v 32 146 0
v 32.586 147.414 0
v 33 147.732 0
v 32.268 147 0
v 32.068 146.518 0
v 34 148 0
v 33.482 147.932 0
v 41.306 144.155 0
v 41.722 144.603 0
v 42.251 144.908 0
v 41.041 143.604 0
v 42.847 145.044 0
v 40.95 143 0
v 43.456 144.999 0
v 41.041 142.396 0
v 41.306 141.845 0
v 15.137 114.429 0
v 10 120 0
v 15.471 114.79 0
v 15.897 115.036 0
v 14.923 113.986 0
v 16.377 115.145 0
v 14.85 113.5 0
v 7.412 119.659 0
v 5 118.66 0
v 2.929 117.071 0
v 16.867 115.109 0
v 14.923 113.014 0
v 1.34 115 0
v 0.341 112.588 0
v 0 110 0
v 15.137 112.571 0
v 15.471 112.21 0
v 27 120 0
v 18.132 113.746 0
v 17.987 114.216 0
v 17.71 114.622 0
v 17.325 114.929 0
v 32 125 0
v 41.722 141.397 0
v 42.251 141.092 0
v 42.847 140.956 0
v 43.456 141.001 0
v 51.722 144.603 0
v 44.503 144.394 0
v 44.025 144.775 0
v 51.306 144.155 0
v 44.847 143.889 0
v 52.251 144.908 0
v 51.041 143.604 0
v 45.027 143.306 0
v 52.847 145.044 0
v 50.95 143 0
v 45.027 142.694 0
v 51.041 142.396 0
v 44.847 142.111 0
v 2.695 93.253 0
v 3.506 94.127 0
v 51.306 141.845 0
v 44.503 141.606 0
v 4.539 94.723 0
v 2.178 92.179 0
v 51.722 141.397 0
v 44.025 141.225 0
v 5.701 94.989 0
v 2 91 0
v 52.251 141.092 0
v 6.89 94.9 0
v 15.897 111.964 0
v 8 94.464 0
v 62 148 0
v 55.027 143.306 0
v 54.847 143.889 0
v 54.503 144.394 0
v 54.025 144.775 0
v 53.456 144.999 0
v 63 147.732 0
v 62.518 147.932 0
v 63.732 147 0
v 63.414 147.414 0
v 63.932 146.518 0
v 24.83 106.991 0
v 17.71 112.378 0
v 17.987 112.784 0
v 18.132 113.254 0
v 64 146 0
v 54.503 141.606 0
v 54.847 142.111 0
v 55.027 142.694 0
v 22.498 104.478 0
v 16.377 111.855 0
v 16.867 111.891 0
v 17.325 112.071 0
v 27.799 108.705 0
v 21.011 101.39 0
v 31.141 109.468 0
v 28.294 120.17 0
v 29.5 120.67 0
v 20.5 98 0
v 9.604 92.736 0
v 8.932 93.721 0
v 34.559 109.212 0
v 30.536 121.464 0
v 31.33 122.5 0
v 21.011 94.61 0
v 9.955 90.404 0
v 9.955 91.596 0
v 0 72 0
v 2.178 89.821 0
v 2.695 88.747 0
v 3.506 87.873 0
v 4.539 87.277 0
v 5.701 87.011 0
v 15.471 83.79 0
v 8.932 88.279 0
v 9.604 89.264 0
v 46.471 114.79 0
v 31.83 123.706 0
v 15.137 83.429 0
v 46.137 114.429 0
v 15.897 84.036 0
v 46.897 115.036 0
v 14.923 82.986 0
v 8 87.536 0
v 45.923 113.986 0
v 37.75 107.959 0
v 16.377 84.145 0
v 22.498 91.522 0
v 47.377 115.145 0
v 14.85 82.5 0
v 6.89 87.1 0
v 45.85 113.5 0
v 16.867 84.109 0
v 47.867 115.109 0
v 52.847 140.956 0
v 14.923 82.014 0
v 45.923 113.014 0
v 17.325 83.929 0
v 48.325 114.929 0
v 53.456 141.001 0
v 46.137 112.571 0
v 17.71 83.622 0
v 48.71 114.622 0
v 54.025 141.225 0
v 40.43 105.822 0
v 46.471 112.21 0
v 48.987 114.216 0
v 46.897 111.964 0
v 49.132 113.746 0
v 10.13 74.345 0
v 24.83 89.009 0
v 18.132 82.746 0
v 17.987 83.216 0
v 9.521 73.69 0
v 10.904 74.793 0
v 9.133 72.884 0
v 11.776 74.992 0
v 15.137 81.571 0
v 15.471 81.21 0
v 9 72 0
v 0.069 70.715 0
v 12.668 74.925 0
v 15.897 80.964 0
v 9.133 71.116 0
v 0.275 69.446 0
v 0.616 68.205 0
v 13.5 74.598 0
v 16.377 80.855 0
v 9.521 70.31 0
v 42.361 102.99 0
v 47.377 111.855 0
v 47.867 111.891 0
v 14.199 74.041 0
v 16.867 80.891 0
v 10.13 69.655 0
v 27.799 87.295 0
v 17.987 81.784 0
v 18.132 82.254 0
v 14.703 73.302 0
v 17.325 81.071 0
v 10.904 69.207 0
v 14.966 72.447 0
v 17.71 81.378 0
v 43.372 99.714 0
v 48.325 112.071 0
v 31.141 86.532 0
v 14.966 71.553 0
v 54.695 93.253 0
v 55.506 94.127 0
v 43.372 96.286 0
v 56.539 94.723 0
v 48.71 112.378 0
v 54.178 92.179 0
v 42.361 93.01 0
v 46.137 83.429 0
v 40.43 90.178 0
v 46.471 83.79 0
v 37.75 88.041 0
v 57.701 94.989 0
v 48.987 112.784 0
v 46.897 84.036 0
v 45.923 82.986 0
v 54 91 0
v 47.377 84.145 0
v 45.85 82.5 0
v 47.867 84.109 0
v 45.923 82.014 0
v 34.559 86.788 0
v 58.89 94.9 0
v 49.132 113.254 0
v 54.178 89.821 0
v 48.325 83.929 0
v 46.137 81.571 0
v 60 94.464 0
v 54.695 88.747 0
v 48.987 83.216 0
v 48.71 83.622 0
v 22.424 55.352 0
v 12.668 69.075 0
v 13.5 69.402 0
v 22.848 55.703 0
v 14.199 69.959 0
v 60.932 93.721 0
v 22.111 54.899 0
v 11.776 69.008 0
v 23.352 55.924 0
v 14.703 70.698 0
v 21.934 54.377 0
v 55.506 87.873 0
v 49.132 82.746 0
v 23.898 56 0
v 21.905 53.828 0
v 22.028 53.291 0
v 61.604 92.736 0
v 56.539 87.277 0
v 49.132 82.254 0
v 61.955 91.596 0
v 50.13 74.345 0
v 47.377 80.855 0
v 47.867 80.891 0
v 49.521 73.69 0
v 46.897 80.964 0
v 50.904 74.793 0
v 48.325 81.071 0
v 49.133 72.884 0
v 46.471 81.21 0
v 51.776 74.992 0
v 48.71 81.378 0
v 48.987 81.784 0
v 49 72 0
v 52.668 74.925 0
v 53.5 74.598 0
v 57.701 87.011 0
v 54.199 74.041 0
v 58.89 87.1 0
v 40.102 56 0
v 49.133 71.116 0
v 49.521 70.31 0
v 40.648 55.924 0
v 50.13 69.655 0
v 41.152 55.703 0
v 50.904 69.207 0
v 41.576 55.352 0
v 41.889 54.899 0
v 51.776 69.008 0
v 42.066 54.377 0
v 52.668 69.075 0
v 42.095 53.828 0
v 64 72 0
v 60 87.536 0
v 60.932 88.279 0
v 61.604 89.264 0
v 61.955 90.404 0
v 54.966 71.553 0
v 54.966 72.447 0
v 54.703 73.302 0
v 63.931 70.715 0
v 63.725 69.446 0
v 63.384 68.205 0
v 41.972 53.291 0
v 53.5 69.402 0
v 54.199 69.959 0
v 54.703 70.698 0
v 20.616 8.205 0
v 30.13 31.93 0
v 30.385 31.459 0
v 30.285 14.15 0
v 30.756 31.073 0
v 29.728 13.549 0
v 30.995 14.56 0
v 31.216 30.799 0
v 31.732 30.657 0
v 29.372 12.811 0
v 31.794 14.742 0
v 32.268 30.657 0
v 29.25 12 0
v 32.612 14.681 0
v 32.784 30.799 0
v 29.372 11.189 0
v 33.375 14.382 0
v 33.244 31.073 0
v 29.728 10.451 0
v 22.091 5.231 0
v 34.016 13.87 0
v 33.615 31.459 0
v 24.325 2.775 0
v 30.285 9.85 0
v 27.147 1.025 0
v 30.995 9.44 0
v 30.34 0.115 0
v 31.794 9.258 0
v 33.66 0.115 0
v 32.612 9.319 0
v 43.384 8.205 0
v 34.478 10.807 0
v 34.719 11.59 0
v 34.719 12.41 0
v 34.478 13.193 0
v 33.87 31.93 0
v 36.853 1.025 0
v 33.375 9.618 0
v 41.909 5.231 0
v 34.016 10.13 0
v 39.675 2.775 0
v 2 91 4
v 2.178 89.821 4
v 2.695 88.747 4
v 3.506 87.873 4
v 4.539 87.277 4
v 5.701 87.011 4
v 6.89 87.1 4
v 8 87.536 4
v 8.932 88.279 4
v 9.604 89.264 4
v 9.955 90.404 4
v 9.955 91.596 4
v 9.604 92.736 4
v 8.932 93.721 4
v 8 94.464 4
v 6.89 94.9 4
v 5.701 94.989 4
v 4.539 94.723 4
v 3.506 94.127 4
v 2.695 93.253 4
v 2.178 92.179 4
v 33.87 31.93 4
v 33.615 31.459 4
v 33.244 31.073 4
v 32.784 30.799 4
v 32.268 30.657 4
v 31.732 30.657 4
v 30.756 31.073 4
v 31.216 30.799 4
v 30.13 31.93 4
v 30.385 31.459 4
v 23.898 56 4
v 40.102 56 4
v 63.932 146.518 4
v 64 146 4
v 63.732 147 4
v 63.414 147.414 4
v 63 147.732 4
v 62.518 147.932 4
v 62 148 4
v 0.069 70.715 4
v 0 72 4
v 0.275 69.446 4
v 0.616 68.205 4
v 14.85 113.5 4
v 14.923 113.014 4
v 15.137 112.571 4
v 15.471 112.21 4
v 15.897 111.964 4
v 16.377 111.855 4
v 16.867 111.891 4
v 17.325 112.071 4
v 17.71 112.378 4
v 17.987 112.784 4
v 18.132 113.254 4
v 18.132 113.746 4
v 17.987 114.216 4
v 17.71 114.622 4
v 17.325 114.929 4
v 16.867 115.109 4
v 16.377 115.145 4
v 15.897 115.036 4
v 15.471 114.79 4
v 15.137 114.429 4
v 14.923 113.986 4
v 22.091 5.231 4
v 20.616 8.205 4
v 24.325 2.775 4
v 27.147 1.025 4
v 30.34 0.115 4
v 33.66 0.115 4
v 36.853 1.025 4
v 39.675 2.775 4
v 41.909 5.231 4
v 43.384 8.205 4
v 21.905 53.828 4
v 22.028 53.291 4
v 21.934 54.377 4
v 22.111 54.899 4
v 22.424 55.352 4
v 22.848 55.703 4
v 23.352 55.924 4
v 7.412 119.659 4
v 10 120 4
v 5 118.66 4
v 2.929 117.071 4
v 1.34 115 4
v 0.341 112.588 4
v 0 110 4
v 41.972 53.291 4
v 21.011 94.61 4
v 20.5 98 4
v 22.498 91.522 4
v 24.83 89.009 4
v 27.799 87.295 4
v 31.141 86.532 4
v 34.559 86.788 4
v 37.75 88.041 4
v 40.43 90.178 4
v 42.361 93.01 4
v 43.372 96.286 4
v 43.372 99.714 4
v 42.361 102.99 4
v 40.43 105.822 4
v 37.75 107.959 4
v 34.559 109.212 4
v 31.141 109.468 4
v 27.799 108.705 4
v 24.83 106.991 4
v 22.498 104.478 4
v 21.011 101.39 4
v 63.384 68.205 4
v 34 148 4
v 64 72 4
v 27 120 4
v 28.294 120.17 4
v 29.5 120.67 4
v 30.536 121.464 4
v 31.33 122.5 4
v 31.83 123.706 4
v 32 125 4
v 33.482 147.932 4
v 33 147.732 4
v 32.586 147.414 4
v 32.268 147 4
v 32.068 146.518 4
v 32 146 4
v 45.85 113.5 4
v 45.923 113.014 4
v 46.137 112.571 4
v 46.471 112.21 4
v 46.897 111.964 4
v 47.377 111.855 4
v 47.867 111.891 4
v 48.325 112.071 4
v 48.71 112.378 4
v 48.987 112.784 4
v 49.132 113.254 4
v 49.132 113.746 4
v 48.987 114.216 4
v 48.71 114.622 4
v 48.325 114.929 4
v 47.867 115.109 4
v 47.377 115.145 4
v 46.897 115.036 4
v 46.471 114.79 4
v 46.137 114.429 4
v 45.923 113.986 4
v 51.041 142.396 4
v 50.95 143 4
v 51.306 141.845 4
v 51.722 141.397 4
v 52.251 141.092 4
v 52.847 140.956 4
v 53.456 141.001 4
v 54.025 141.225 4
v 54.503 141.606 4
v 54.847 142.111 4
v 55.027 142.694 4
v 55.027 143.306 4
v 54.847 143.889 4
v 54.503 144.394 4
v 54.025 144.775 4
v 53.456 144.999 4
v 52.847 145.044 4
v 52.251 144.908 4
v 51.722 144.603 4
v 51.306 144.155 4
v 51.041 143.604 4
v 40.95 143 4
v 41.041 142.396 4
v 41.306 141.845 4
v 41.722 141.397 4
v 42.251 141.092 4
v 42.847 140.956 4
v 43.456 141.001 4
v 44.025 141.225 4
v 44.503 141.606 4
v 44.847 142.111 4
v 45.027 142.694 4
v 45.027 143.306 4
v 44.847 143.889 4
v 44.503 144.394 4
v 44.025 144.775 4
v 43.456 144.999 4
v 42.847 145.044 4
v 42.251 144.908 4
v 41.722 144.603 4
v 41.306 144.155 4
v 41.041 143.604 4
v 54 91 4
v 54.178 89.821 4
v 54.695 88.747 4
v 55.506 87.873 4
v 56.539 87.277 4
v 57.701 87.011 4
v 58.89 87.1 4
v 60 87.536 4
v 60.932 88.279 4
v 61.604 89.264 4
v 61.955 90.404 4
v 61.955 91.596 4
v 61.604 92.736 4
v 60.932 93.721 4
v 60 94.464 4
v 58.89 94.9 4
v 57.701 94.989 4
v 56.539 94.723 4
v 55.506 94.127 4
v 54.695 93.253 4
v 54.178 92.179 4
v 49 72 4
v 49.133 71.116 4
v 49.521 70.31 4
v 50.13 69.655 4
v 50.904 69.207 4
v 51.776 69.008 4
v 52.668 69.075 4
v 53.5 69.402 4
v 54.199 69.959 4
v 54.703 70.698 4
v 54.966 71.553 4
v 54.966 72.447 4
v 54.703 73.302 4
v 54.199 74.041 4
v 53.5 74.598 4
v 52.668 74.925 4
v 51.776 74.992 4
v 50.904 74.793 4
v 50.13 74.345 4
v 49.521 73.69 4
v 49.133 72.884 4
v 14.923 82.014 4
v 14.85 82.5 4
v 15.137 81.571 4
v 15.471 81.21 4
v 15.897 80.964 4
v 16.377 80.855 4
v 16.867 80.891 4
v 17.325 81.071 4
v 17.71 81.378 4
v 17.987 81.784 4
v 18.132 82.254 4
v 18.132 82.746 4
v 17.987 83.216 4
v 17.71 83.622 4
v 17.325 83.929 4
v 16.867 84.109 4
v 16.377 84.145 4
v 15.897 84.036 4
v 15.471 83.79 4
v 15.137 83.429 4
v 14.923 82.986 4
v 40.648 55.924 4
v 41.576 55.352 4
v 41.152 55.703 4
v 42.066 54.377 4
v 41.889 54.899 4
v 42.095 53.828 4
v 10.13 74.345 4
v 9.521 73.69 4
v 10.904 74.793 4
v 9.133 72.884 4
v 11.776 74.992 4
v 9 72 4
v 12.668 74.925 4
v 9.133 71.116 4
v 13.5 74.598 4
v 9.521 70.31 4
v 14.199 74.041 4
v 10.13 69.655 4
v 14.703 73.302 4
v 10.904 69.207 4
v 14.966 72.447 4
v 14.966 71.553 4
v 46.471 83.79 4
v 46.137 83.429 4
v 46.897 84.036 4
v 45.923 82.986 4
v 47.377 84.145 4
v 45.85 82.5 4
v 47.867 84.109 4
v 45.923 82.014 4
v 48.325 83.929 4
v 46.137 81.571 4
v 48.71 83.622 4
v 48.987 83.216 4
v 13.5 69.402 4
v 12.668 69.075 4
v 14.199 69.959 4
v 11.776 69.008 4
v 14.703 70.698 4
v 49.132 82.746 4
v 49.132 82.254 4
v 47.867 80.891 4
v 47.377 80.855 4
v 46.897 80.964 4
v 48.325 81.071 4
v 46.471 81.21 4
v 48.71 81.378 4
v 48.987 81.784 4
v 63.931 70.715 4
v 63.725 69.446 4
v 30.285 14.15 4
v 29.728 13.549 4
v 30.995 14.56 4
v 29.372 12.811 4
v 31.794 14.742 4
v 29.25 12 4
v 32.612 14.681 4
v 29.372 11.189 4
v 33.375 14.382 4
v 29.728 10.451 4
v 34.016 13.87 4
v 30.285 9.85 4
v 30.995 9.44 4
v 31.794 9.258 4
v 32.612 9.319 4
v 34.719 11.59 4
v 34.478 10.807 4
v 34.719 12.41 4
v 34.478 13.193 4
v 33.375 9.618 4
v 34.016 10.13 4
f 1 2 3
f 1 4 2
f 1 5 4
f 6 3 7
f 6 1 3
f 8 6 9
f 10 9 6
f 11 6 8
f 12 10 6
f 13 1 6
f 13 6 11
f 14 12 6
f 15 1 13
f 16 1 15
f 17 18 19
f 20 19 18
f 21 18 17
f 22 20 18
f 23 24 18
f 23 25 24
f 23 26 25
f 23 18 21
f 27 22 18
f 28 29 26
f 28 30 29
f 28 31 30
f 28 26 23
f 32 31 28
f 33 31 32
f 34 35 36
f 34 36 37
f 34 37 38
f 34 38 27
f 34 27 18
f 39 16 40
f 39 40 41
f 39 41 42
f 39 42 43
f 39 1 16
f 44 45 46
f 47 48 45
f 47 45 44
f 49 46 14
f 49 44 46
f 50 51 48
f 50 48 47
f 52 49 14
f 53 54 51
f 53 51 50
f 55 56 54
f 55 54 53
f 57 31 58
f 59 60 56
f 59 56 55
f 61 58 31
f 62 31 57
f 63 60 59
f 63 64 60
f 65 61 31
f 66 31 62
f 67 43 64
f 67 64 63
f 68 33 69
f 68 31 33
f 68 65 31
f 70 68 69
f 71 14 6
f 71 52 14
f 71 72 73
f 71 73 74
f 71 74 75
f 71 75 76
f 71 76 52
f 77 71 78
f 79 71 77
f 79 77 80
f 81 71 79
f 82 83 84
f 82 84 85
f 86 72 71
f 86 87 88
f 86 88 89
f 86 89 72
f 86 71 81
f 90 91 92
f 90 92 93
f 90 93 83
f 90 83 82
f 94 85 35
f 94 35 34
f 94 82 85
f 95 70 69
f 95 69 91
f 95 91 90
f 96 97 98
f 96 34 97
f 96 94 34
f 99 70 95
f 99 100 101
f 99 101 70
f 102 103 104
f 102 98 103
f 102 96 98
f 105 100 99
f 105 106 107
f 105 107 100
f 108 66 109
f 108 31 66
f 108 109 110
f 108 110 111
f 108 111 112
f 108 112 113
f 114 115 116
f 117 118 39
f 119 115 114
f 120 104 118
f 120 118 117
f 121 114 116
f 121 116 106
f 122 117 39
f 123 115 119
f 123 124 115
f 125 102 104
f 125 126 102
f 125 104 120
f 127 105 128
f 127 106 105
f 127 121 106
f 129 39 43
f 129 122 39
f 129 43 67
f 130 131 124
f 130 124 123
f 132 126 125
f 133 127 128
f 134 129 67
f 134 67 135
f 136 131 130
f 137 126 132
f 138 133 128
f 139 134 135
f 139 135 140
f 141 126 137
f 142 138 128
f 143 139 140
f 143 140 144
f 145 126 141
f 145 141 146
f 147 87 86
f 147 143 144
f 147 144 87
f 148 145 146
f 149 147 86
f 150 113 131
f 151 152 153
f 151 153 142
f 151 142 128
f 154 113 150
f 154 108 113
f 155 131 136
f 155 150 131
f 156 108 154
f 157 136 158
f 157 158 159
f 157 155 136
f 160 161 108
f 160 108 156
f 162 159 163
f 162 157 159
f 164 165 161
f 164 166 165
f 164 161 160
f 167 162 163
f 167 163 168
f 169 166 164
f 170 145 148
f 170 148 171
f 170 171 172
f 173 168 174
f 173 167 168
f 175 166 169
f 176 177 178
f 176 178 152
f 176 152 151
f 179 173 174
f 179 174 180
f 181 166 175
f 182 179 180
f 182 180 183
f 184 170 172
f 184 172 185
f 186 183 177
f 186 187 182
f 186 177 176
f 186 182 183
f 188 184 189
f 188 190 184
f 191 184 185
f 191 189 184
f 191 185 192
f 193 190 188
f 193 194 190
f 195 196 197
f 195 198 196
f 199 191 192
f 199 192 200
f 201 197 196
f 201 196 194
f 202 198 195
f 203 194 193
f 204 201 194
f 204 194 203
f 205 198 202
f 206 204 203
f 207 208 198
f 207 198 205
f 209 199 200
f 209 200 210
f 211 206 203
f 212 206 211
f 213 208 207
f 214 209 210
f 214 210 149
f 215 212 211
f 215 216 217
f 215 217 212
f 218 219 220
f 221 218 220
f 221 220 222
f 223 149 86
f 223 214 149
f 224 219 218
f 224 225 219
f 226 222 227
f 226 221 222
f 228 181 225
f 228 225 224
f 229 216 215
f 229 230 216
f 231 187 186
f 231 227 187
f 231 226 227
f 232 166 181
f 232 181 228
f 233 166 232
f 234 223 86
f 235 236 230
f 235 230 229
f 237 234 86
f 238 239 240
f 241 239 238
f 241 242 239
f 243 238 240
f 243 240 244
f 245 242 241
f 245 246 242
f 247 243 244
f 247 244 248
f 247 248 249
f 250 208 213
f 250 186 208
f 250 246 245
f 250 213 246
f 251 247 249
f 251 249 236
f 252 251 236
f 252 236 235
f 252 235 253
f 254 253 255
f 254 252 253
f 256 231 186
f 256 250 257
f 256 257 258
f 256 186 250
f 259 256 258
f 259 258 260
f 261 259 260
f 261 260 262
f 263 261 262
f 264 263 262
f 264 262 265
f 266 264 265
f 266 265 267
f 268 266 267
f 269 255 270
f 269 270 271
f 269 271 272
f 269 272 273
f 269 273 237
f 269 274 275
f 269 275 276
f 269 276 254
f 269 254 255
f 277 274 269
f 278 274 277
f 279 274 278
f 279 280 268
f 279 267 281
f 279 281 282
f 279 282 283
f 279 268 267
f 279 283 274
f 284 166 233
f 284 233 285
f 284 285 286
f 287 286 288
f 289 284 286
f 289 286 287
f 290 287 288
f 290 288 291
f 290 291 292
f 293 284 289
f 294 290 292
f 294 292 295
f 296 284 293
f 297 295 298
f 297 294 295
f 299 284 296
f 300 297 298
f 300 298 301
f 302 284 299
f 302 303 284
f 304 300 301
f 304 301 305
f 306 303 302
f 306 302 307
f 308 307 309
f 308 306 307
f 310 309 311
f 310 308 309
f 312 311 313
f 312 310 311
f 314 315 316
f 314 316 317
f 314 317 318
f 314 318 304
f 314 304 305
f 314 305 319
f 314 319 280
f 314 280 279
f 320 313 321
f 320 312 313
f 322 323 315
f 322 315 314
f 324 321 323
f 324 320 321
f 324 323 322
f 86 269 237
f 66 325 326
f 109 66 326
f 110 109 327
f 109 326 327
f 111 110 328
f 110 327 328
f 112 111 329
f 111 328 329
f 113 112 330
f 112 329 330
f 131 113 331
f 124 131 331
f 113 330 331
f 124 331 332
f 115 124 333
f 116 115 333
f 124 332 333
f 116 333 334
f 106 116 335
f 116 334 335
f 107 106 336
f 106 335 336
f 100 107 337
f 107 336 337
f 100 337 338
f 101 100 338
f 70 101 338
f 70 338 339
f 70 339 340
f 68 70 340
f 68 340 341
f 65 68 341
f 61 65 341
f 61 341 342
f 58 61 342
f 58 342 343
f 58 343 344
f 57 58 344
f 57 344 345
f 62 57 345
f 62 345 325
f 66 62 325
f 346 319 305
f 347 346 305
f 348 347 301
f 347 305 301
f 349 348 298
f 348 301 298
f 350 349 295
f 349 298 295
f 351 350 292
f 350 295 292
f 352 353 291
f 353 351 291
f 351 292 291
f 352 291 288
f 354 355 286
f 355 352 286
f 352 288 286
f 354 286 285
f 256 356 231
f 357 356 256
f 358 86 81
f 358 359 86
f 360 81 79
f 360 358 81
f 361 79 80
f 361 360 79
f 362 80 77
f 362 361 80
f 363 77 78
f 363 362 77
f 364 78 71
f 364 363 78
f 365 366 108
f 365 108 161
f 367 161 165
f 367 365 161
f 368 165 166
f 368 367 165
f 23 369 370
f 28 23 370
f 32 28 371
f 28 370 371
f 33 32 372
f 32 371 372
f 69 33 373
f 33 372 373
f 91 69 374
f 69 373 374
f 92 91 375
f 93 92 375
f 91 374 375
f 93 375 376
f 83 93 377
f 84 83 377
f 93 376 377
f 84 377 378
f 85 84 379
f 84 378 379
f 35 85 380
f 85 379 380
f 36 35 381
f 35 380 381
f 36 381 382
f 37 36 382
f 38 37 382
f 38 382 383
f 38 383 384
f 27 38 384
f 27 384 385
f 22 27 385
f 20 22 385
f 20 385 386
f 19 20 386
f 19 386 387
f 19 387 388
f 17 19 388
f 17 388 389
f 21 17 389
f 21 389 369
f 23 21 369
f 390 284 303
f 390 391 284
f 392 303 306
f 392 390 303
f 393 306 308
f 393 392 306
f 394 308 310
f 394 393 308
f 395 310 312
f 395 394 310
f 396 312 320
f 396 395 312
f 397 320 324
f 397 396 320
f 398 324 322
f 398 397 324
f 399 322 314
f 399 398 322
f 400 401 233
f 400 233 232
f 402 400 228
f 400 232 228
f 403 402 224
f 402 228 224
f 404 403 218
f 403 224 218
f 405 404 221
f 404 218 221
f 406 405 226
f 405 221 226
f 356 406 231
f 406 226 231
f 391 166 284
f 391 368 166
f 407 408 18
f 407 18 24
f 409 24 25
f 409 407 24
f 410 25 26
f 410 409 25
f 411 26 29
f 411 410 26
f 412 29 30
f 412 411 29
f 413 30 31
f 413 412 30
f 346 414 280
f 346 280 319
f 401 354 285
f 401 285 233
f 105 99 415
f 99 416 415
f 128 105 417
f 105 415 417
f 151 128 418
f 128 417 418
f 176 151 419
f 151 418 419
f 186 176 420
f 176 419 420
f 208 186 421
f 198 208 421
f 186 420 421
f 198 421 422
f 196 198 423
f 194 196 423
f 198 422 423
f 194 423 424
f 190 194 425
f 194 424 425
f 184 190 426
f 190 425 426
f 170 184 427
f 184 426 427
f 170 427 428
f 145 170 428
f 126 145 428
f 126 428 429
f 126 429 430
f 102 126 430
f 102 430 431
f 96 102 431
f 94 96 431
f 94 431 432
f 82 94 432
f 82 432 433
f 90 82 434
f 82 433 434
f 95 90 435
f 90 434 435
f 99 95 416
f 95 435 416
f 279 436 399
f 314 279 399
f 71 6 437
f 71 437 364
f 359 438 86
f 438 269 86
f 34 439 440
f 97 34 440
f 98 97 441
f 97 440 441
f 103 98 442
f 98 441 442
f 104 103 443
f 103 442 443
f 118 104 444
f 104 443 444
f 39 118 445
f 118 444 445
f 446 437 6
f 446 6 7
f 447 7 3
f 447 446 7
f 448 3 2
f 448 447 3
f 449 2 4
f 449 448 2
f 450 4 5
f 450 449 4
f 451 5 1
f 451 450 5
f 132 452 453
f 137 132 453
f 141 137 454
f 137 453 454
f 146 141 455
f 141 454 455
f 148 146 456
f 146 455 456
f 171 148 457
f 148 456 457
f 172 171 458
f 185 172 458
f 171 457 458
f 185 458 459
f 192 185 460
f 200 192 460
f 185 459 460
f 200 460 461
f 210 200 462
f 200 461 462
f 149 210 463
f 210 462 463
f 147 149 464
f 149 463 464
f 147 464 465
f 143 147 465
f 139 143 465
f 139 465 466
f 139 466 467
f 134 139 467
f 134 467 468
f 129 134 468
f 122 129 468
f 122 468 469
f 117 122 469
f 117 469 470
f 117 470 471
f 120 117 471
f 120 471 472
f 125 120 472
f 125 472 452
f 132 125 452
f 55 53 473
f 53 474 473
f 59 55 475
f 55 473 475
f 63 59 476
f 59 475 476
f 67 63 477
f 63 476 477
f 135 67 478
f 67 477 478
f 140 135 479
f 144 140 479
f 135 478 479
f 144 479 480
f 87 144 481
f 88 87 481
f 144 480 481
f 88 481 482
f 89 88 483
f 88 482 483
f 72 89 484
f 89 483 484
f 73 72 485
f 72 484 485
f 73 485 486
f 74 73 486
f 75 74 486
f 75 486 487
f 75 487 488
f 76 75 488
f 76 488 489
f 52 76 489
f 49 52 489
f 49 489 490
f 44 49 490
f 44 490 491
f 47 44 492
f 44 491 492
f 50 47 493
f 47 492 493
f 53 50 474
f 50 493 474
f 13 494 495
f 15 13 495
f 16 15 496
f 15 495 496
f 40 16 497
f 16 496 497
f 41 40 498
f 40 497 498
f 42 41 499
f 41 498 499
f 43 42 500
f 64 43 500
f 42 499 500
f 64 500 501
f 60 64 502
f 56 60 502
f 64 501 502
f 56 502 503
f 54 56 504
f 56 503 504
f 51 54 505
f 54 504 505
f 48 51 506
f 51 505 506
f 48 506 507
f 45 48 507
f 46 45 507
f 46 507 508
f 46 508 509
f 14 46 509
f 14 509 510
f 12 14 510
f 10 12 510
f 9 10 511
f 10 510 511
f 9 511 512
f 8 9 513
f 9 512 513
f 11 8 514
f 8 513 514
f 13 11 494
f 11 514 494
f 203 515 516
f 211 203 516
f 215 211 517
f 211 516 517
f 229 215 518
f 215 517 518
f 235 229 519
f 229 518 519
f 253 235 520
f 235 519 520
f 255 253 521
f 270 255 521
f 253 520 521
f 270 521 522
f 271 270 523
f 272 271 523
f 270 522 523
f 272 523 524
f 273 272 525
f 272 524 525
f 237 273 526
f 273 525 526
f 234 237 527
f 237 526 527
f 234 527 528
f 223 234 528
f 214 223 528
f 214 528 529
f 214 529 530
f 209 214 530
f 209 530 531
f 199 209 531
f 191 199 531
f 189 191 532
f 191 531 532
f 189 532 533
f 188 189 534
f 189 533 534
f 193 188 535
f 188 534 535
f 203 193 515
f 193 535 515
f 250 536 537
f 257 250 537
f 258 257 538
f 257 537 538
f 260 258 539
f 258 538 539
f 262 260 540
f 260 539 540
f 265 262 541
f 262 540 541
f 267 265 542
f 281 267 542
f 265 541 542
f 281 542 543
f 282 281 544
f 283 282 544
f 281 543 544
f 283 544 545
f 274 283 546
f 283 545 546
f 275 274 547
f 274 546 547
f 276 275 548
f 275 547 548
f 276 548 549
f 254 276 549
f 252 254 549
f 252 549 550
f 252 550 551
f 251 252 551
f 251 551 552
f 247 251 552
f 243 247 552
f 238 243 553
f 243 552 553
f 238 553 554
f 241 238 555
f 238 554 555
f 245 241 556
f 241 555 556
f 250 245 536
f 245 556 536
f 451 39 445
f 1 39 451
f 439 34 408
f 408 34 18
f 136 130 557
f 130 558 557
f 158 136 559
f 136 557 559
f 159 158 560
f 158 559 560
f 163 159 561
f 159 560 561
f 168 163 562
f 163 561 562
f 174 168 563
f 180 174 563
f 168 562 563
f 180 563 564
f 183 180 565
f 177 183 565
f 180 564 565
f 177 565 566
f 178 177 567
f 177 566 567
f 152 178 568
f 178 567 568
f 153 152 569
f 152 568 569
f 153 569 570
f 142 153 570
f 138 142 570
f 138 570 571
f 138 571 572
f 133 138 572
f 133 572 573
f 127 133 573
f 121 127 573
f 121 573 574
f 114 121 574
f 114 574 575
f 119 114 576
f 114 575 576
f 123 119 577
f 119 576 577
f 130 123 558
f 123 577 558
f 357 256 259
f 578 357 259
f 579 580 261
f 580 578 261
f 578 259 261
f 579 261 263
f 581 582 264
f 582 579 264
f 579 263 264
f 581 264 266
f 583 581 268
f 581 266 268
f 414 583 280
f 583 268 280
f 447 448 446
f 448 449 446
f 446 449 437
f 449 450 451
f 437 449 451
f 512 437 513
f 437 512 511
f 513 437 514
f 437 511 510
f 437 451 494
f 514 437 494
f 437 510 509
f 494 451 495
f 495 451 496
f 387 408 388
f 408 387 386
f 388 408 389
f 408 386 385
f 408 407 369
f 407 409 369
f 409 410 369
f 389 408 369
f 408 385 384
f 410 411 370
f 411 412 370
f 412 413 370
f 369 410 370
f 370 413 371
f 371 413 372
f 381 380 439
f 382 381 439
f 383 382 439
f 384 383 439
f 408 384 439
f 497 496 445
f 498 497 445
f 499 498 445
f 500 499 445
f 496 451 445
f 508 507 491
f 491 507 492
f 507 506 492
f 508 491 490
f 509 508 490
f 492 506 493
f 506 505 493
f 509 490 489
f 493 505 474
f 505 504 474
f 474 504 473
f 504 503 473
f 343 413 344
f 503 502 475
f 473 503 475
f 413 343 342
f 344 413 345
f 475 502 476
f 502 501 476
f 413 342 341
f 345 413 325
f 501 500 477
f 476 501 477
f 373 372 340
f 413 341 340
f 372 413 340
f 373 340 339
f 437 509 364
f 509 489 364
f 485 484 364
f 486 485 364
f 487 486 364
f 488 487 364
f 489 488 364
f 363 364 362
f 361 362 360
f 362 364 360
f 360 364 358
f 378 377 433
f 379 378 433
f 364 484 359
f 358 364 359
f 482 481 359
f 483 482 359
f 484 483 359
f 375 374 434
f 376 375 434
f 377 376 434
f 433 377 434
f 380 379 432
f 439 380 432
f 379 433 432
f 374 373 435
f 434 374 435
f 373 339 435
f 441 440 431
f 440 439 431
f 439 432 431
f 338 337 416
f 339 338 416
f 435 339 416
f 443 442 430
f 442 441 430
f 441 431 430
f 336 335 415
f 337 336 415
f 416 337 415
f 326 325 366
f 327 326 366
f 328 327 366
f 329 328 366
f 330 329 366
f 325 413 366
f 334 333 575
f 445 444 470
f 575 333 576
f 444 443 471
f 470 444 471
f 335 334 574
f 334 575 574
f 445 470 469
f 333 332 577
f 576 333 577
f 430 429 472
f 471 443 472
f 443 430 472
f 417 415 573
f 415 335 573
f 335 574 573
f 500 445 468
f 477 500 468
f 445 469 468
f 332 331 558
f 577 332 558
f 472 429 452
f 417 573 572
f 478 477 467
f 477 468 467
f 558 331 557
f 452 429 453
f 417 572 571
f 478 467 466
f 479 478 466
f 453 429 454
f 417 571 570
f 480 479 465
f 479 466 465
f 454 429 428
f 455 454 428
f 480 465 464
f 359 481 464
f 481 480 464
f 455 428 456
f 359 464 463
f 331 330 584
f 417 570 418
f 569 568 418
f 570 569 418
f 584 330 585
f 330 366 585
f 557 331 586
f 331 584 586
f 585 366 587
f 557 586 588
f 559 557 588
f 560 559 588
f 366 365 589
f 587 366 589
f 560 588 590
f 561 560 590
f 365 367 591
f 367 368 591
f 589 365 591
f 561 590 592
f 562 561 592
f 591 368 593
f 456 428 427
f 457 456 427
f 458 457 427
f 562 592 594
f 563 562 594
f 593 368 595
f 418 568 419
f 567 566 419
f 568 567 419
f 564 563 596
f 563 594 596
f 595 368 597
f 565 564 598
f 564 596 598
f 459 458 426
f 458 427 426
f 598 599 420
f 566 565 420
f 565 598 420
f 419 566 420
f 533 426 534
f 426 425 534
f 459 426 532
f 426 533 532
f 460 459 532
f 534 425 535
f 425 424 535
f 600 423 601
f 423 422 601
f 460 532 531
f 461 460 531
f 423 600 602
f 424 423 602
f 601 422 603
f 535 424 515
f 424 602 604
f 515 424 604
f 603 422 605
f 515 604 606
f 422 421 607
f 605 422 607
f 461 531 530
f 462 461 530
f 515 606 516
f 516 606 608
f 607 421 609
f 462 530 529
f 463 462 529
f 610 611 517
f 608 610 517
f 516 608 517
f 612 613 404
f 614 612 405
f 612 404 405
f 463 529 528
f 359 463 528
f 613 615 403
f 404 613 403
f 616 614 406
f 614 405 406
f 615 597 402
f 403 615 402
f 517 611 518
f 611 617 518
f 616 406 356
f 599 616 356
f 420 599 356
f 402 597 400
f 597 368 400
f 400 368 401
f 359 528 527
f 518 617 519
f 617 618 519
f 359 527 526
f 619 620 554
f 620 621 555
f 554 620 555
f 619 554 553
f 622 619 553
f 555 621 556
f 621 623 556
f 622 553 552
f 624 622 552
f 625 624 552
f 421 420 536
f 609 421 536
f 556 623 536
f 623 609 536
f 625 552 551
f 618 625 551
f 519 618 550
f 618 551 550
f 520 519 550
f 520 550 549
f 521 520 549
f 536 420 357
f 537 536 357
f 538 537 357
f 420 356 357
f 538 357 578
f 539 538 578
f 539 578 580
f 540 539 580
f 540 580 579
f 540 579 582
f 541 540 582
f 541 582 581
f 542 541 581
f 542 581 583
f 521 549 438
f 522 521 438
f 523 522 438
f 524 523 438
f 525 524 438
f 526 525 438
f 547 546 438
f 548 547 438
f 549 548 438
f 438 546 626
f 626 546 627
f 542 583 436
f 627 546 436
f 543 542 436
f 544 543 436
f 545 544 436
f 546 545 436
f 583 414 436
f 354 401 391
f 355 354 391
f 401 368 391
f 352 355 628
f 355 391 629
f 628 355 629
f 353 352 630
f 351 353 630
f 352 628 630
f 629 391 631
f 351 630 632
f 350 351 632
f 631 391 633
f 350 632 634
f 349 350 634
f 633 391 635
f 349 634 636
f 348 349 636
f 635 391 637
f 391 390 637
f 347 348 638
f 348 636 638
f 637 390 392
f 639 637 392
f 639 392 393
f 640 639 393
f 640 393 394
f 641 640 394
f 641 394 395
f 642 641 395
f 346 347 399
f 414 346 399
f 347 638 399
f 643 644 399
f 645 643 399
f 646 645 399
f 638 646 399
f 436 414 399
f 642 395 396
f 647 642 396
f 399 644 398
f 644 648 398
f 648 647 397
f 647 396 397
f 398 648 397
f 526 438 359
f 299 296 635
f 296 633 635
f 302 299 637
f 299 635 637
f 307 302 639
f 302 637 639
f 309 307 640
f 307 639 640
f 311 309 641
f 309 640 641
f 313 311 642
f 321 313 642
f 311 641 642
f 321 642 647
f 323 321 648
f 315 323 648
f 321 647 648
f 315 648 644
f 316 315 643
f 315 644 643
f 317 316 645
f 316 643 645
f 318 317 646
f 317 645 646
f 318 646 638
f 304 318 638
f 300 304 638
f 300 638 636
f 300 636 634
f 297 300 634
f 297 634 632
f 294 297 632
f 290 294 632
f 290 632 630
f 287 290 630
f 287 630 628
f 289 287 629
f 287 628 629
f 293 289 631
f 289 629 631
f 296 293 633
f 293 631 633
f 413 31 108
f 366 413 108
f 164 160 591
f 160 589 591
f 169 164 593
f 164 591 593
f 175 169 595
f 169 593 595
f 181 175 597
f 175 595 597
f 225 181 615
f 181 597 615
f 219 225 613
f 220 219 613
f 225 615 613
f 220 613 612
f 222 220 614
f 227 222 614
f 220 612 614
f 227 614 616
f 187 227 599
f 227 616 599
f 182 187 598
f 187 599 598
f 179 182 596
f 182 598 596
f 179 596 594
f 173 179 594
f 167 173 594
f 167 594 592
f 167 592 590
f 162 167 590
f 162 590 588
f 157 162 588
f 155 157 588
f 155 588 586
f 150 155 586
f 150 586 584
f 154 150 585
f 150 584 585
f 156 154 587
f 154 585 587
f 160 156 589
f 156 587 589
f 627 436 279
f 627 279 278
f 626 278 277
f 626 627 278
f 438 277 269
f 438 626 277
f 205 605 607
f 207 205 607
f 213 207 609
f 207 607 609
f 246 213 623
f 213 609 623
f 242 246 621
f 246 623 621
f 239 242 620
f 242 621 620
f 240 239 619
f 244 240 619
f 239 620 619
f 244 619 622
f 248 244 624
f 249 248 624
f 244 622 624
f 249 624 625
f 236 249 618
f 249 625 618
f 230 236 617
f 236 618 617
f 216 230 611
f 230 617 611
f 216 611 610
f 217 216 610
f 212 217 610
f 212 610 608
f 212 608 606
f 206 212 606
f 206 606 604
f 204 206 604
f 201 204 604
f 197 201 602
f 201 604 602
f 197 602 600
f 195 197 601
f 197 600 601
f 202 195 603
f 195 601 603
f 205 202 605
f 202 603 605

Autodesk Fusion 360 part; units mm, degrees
sketch "Sketch1" plane through (0, 0, 0) normal (0, 0, 1) x (1, 0, 0) in component "Laser Carriage - Motor Side V2"
  line L0 (0, 0) -> (64, 0)
  line L1 (64, 0) -> (64, 120)
  line L2 (64, 120) -> (0, 120)
  line L3 (0, 120) -> (0, 0)
  dimension "d1" = 64
  dimension "d2" = 120
extrude "Extrude1" add sketch "Sketch1" along normal blind 4 in component "Laser Carriage - Motor Side V2"
sketch "Sketch2" plane through (0, 0, 4) normal (0, 0, 1) x (-1, 0, 0) in component "Laser Carriage - Motor Side V2"
  line L0 (0, -120) -> (0, 0)
  line L1 (0, 0) -> (-64, 0)
  line L2 (-64, 0) -> (-64, -120)
  line L3 (-64, -120) -> (0, -120)
  line L4 (-12, -120) -> (-12, 0) construction
  line L5 (-52, -120) -> (-52, 0) construction
  line L6 (0, -12) -> (-64, -12) construction
  line L7 (0, -72) -> (-64, -72) construction
  circle A0 centre (-12, -72) radius 12 construction
  circle A1 centre (-52, -72) radius 12 construction
  circle A2 centre (-12, -72) radius 3
  circle A3 centre (-52, -72) radius 3
  circle A4 centre (-32, -12) radius 12 construction
  circle A5 centre (-32, -12) radius 2.75
  line L8 (0, -85) -> (-64, -85) construction
  line L9 (-32, -85) -> (-32, 0) construction
  line L10 (0, -42) -> (-64, -42) construction
  line L11 (0, -27) -> (-64, -27) construction
  line L12 (0, -56) -> (-64, -56) construction
  line L13 (-21, -56) -> (-21, -27) construction
  line L14 (-43, -56) -> (-43, -27) construction
  line L15 (-21, -56) -> (-43, -56)
  line L16 (-43, -56) -> (-32, -27)
  line L17 (-32, -27) -> (-21, -56)
  point P0 (-32, -42)
  dimension "d8" = 12
  dimension "d13" = 24
  dimension "d14" = 24
  dimension "d16" = 6
  dimension "d17" = 6
  dimension "d40" = 60
  dimension "d53" = 24
  dimension "d55" = 5.5
  dimension "d234" = 13
  dimension "d238" = 20
  dimension "d324" = 30
  dimension "d327" = 20
  dimension "d333" = 15
  dimension "d334" = 56
  dimension "d335" = 11
  dimension "d336" = 11
extrude "Extrude2" cut sketch "Sketch2" against normal up to surface (4 mm away) contours A2 | A3 | A5 | L15 L16 L17 in component "Laser Carriage - Motor Side V2"
sketch "Sketch16" plane through (0, 0, 4) normal (0, 0, 1) x (-1, 0, 0) in component "Laser Carriage - Motor Side V2"
  circle A0 centre (-52, -72) radius 3
  circle A1 centre (-12, -72) radius 3
  line L0 (-64, -120) -> (0, -120)
  line L1 (0, -120) -> (0, 0)
  line L2 (0, 0) -> (-64, 0)
  line L3 (-64, 0) -> (-64, -120)
  circle A2 centre (-32, -12) radius 2.75
  line L4 (0, -91) -> (-64, -91) construction
  line L5 (-64, -120) -> (0, -120) construction
  line L6 (-6, 0) -> (-6, -120) construction
  line L7 (0, -120) -> (0, 0) construction
  line L8 (-58, 0) -> (-58, -120) construction
  circle A3 centre (-6, -91) radius 4
  circle A4 centre (-58, -91) radius 4
  line L9 (0, 0) -> (-64, 0)
  line L10 (-43, -56) -> (-32, -27)
  line L11 (-32, -27) -> (-21, -56)
  line L12 (-21, -56) -> (-43, -56)
  dimension "d268" = 6
  dimension "d269" = 6
  dimension "d270" = 8
  dimension "d271" = 8
  dimension "d273" = 91
extrude "Extrude17" cut sketch "Sketch16" against normal up to surface (4 mm away) contours A3 | A4 in component "Laser Carriage - Motor Side V2"
sketch "Sketch18" plane through (0, 0, 4) normal (0, 0, 1) x (-1, 0, 0) in component "Laser Carriage - Motor Side V2"
  line L0 (-64, -120) -> (0, -120)
  line L1 (-32, -120) -> (-32, 0) construction
  line L2 (0, 0) -> (-64, 0) construction
  line L3 (-47.5, -120) -> (-47.5, 0) construction
  line L4 (-16.5, 0) -> (-16.5, -120) construction
  line L5 (-2, -113.5) -> (-62, -113.5) construction
  line L6 (-2, -82.5) -> (-62, -82.5) construction
  line L7 (-2, -98) -> (-62, -98) construction
  circle A0 centre (-32, -98) radius 11.5
  circle A1 centre (-16.5, -113.5) radius 1.65
  circle A2 centre (-47.5, -113.5) radius 1.65
  circle A3 centre (-16.5, -82.5) radius 1.65
  circle A4 centre (-47.5, -82.5) radius 1.65
  line L8 (-2, -120) -> (-62, -120) construction
  line L9 (-54, -120) -> (-10, -120) construction
  line L10 (-10, -120) -> (-10, -76) construction
  line L11 (-10, -76) -> (-54, -76) construction
  line L12 (-54, -76) -> (-54, -120) construction
  line L13 (-54, -120) -> (-10, -76) construction
  line L14 (-10, -120) -> (-54, -76) construction
  point P0 (-32, -98)
  dimension "d275" = 15.5
  dimension "d276" = 15.5
  dimension "d279" = 98
  dimension "d280" = 15.5
  dimension "d281" = 15.5
  dimension "d283" = 23
  dimension "d284" = 3.3
  dimension "d285" = 3.3
  dimension "d286" = 3.3
  dimension "d287" = 3.3
  dimension "d288" = 6.5
  dimension "d289" = 44
  dimension "d290" = 44
extrude "Extrude18" cut sketch "Sketch18" against normal up to surface (4 mm away) in component "Laser Carriage - Motor Side V2"
sketch "Sketch20" plane through (0, 0, 0) normal (0, 0, -1) x (1, 0, 0) in component "Laser Carriage - Motor Side V2"
  circle A0 centre (16.5, -113.5) radius 1.65
  circle A1 centre (47.5, -113.5) radius 1.65
  circle A2 centre (16.5, -82.5) radius 1.65
  circle A3 centre (32, -98) radius 11.5
  circle A4 centre (47.5, -82.5) radius 1.65
  circle A5 centre (6, -91) radius 4
  circle A6 centre (58, -91) radius 4
  circle A7 centre (52, -72) radius 3
  circle A8 centre (32, -12) radius 2.75
  circle A9 centre (12, -72) radius 3
  line L0 (0, 0) -> (0, -120)
  line L1 (0, -120) -> (64, -120)
  line L2 (64, -120) -> (64, 0)
  line L3 (64, 0) -> (0, 0)
  line L4 (64, -120) -> (64, -148)
  line L5 (32, -120) -> (32, -148)
  line L6 (32, -148) -> (64, -148)
  line L7 (32, -27) -> (43, -56)
  line L8 (43, -56) -> (21, -56)
  line L9 (21, -56) -> (32, -27)
  dimension "d303" = 28
  dimension "d304" = 28
extrude "Extrude20" add sketch "Sketch20" against normal blind 4 contours L1 L4 L5 L6 in component "Laser Carriage - Motor Side V2"
sketch "Sketch21" plane through (0, 0, 4) normal (0, 0, 1) x (-1, 0, 0) in component "Laser Carriage - Motor Side V2"
  circle A0 centre (-16.5, -113.5) radius 1.65
  circle A1 centre (-47.5, -113.5) radius 1.65
  circle A2 centre (-16.5, -82.5) radius 1.65
  circle A3 centre (-32, -98) radius 11.5
  circle A4 centre (-47.5, -82.5) radius 1.65
  circle A5 centre (-6, -91) radius 4
  circle A6 centre (-58, -91) radius 4
  line L0 (0, -120) -> (0, 0)
  line L1 (0, 0) -> (-64, 0)
  line L2 (-64, 0) -> (-64, -148)
  line L3 (-64, -148) -> (-32, -148)
  line L4 (-32, -148) -> (-32, -120)
  line L5 (-32, -120) -> (0, -120)
  circle A7 centre (-52, -72) radius 3
  circle A8 centre (-32, -12) radius 2.75
  circle A9 centre (-12, -72) radius 3
  line L6 (-48, -148) -> (-48, -122) construction
  line L7 (-32, -138) -> (-64, -138) construction
  line L8 (-54, -120) -> (-10, -120) construction
  line L9 (-32, -143) -> (-64, -143) construction
  line L10 (-53, -148) -> (-53, -138) construction
  line L11 (-43, -148) -> (-43, -138) construction
  circle A10 centre (-43, -143) radius 2.05
  circle A11 centre (-53, -143) radius 2.05
  line L12 (-43, -56) -> (-32, -27)
  line L13 (-32, -27) -> (-21, -56)
  line L14 (-21, -56) -> (-43, -56)
  dimension "d309" = 18
  dimension "d310" = 5
  dimension "d311" = 10
  dimension "d312" = 5
  dimension "d313" = 4.1
  dimension "d314" = 4.1
extrude "Extrude21" cut sketch "Sketch21" against normal blind 4 contours A10 | A11 in component "Laser Carriage - Motor Side V2"
sketch "Sketch22" plane through (0, 0, 4) normal (0, 0, 1) x (-1, 0, 0) in component "Laser Carriage - Motor Side V2"
  circle A0 centre (-43, -143) radius 2.05
  circle A1 centre (-53, -143) radius 2.05
  circle A2 centre (-16.5, -113.5) radius 1.65
  circle A3 centre (-47.5, -113.5) radius 1.65
  circle A4 centre (-16.5, -82.5) radius 1.65
  circle A5 centre (-32, -98) radius 11.5
  circle A6 centre (-47.5, -82.5) radius 1.65
  circle A7 centre (-6, -91) radius 4
  circle A8 centre (-58, -91) radius 4
  circle A9 centre (-12, -72) radius 3
  circle A10 centre (-52, -72) radius 3
  circle A11 centre (-32, -12) radius 2.75
  line L0 (0, -120) -> (0, 0)
  line L1 (0, 0) -> (-64, 0)
  line L2 (-64, 0) -> (-64, -148)
  line L3 (-64, -148) -> (-32, -148)
  line L4 (-32, -148) -> (-32, -120)
  line L5 (-32, -120) -> (0, -120)
  circle A12 centre (-12, -72) radius 12
  circle A13 centre (-52, -72) radius 12
  circle A14 centre (-32, -12) radius 12
  line L6 (-0.6158, -68.2053) -> (-20.6158, -8.2053)
  line L7 (-63.3842, -68.2053) -> (-43.3842, -8.2053)
  line L8 (-43, -56) -> (-32, -27)
  line L9 (-32, -27) -> (-21, -56)
  line L10 (-21, -56) -> (-43, -56)
  dimension "d328" = 24
  dimension "d329" = 24
  dimension "d330" = 24
extrude "Extrude22" cut sketch "Sketch22" against normal up to surface (4 mm away) contours L0 L1 A12 A14 L6 | L1 L2 A13 A14 L7 in component "Laser Carriage - Motor Side V2"
sketch "Sketch23" plane through (0, 0, 4) normal (0, 0, 1) x (-1, 0, 0) in component "Laser Carriage - Motor Side V2"
  arc A0 (-63.3842, -68.2053) -> (-64, -72) centre (-52, -72) ccw
  line L0 (-64, -72) -> (-64, -148)
  line L1 (-64, -148) -> (-32, -148)
  line L2 (-32, -148) -> (-32, -120)
  line L3 (-32, -120) -> (0, -120)
  line L4 (0, -120) -> (0, -72)
  arc A1 (0, -72) -> (-0.6158, -68.2053) centre (-12, -72) ccw
  line L5 (-0.6158, -68.2053) -> (-20.6158, -8.2053)
  arc A2 (-20.6158, -8.2053) -> (-43.3842, -8.2053) centre (-32, -12) ccw
  line L6 (-43.3842, -8.2053) -> (-63.3842, -68.2053)
  circle A3 centre (-43, -143) radius 2.05
  circle A4 centre (-53, -143) radius 2.05
  circle A5 centre (-16.5, -113.5) radius 1.65
  circle A6 centre (-47.5, -113.5) radius 1.65
  circle A7 centre (-16.5, -82.5) radius 1.65
  circle A8 centre (-32, -98) radius 11.5
  circle A9 centre (-47.5, -82.5) radius 1.65
  circle A10 centre (-6, -91) radius 4
  circle A11 centre (-58, -91) radius 4
  circle A12 centre (-12, -72) radius 3
  circle A13 centre (-52, -72) radius 3
  circle A14 centre (-32, -12) radius 2.75
  line L7 (-43, -56) -> (-32, -27)
  line L8 (-32, -27) -> (-21, -56)
  line L9 (-21, -56) -> (-43, -56)
fillet "Fillet11" radius 5 1 edges at (32, 120, 2) in component "Laser Carriage - Motor Side V2"
fillet "Fillet11" radius 2 2 edges at (32, 148, 2) (64, 148, 2) in component "Laser Carriage - Motor Side V2"
fillet "Fillet11" radius 2 3 edges at (21, 56, 2) (43, 56, 2) (32, 27, 2) in component "Laser Carriage - Motor Side V2"
fillet "Fillet11" radius 10 1 edges at (0, 120, 2) in component "Laser Carriage - Motor Side V2"
component "Laser Carriage - Motor Side V2" placed x (1, 0, 0) y (0, 1, 0) z (0, 0, 1) at (0, 0, 0)
